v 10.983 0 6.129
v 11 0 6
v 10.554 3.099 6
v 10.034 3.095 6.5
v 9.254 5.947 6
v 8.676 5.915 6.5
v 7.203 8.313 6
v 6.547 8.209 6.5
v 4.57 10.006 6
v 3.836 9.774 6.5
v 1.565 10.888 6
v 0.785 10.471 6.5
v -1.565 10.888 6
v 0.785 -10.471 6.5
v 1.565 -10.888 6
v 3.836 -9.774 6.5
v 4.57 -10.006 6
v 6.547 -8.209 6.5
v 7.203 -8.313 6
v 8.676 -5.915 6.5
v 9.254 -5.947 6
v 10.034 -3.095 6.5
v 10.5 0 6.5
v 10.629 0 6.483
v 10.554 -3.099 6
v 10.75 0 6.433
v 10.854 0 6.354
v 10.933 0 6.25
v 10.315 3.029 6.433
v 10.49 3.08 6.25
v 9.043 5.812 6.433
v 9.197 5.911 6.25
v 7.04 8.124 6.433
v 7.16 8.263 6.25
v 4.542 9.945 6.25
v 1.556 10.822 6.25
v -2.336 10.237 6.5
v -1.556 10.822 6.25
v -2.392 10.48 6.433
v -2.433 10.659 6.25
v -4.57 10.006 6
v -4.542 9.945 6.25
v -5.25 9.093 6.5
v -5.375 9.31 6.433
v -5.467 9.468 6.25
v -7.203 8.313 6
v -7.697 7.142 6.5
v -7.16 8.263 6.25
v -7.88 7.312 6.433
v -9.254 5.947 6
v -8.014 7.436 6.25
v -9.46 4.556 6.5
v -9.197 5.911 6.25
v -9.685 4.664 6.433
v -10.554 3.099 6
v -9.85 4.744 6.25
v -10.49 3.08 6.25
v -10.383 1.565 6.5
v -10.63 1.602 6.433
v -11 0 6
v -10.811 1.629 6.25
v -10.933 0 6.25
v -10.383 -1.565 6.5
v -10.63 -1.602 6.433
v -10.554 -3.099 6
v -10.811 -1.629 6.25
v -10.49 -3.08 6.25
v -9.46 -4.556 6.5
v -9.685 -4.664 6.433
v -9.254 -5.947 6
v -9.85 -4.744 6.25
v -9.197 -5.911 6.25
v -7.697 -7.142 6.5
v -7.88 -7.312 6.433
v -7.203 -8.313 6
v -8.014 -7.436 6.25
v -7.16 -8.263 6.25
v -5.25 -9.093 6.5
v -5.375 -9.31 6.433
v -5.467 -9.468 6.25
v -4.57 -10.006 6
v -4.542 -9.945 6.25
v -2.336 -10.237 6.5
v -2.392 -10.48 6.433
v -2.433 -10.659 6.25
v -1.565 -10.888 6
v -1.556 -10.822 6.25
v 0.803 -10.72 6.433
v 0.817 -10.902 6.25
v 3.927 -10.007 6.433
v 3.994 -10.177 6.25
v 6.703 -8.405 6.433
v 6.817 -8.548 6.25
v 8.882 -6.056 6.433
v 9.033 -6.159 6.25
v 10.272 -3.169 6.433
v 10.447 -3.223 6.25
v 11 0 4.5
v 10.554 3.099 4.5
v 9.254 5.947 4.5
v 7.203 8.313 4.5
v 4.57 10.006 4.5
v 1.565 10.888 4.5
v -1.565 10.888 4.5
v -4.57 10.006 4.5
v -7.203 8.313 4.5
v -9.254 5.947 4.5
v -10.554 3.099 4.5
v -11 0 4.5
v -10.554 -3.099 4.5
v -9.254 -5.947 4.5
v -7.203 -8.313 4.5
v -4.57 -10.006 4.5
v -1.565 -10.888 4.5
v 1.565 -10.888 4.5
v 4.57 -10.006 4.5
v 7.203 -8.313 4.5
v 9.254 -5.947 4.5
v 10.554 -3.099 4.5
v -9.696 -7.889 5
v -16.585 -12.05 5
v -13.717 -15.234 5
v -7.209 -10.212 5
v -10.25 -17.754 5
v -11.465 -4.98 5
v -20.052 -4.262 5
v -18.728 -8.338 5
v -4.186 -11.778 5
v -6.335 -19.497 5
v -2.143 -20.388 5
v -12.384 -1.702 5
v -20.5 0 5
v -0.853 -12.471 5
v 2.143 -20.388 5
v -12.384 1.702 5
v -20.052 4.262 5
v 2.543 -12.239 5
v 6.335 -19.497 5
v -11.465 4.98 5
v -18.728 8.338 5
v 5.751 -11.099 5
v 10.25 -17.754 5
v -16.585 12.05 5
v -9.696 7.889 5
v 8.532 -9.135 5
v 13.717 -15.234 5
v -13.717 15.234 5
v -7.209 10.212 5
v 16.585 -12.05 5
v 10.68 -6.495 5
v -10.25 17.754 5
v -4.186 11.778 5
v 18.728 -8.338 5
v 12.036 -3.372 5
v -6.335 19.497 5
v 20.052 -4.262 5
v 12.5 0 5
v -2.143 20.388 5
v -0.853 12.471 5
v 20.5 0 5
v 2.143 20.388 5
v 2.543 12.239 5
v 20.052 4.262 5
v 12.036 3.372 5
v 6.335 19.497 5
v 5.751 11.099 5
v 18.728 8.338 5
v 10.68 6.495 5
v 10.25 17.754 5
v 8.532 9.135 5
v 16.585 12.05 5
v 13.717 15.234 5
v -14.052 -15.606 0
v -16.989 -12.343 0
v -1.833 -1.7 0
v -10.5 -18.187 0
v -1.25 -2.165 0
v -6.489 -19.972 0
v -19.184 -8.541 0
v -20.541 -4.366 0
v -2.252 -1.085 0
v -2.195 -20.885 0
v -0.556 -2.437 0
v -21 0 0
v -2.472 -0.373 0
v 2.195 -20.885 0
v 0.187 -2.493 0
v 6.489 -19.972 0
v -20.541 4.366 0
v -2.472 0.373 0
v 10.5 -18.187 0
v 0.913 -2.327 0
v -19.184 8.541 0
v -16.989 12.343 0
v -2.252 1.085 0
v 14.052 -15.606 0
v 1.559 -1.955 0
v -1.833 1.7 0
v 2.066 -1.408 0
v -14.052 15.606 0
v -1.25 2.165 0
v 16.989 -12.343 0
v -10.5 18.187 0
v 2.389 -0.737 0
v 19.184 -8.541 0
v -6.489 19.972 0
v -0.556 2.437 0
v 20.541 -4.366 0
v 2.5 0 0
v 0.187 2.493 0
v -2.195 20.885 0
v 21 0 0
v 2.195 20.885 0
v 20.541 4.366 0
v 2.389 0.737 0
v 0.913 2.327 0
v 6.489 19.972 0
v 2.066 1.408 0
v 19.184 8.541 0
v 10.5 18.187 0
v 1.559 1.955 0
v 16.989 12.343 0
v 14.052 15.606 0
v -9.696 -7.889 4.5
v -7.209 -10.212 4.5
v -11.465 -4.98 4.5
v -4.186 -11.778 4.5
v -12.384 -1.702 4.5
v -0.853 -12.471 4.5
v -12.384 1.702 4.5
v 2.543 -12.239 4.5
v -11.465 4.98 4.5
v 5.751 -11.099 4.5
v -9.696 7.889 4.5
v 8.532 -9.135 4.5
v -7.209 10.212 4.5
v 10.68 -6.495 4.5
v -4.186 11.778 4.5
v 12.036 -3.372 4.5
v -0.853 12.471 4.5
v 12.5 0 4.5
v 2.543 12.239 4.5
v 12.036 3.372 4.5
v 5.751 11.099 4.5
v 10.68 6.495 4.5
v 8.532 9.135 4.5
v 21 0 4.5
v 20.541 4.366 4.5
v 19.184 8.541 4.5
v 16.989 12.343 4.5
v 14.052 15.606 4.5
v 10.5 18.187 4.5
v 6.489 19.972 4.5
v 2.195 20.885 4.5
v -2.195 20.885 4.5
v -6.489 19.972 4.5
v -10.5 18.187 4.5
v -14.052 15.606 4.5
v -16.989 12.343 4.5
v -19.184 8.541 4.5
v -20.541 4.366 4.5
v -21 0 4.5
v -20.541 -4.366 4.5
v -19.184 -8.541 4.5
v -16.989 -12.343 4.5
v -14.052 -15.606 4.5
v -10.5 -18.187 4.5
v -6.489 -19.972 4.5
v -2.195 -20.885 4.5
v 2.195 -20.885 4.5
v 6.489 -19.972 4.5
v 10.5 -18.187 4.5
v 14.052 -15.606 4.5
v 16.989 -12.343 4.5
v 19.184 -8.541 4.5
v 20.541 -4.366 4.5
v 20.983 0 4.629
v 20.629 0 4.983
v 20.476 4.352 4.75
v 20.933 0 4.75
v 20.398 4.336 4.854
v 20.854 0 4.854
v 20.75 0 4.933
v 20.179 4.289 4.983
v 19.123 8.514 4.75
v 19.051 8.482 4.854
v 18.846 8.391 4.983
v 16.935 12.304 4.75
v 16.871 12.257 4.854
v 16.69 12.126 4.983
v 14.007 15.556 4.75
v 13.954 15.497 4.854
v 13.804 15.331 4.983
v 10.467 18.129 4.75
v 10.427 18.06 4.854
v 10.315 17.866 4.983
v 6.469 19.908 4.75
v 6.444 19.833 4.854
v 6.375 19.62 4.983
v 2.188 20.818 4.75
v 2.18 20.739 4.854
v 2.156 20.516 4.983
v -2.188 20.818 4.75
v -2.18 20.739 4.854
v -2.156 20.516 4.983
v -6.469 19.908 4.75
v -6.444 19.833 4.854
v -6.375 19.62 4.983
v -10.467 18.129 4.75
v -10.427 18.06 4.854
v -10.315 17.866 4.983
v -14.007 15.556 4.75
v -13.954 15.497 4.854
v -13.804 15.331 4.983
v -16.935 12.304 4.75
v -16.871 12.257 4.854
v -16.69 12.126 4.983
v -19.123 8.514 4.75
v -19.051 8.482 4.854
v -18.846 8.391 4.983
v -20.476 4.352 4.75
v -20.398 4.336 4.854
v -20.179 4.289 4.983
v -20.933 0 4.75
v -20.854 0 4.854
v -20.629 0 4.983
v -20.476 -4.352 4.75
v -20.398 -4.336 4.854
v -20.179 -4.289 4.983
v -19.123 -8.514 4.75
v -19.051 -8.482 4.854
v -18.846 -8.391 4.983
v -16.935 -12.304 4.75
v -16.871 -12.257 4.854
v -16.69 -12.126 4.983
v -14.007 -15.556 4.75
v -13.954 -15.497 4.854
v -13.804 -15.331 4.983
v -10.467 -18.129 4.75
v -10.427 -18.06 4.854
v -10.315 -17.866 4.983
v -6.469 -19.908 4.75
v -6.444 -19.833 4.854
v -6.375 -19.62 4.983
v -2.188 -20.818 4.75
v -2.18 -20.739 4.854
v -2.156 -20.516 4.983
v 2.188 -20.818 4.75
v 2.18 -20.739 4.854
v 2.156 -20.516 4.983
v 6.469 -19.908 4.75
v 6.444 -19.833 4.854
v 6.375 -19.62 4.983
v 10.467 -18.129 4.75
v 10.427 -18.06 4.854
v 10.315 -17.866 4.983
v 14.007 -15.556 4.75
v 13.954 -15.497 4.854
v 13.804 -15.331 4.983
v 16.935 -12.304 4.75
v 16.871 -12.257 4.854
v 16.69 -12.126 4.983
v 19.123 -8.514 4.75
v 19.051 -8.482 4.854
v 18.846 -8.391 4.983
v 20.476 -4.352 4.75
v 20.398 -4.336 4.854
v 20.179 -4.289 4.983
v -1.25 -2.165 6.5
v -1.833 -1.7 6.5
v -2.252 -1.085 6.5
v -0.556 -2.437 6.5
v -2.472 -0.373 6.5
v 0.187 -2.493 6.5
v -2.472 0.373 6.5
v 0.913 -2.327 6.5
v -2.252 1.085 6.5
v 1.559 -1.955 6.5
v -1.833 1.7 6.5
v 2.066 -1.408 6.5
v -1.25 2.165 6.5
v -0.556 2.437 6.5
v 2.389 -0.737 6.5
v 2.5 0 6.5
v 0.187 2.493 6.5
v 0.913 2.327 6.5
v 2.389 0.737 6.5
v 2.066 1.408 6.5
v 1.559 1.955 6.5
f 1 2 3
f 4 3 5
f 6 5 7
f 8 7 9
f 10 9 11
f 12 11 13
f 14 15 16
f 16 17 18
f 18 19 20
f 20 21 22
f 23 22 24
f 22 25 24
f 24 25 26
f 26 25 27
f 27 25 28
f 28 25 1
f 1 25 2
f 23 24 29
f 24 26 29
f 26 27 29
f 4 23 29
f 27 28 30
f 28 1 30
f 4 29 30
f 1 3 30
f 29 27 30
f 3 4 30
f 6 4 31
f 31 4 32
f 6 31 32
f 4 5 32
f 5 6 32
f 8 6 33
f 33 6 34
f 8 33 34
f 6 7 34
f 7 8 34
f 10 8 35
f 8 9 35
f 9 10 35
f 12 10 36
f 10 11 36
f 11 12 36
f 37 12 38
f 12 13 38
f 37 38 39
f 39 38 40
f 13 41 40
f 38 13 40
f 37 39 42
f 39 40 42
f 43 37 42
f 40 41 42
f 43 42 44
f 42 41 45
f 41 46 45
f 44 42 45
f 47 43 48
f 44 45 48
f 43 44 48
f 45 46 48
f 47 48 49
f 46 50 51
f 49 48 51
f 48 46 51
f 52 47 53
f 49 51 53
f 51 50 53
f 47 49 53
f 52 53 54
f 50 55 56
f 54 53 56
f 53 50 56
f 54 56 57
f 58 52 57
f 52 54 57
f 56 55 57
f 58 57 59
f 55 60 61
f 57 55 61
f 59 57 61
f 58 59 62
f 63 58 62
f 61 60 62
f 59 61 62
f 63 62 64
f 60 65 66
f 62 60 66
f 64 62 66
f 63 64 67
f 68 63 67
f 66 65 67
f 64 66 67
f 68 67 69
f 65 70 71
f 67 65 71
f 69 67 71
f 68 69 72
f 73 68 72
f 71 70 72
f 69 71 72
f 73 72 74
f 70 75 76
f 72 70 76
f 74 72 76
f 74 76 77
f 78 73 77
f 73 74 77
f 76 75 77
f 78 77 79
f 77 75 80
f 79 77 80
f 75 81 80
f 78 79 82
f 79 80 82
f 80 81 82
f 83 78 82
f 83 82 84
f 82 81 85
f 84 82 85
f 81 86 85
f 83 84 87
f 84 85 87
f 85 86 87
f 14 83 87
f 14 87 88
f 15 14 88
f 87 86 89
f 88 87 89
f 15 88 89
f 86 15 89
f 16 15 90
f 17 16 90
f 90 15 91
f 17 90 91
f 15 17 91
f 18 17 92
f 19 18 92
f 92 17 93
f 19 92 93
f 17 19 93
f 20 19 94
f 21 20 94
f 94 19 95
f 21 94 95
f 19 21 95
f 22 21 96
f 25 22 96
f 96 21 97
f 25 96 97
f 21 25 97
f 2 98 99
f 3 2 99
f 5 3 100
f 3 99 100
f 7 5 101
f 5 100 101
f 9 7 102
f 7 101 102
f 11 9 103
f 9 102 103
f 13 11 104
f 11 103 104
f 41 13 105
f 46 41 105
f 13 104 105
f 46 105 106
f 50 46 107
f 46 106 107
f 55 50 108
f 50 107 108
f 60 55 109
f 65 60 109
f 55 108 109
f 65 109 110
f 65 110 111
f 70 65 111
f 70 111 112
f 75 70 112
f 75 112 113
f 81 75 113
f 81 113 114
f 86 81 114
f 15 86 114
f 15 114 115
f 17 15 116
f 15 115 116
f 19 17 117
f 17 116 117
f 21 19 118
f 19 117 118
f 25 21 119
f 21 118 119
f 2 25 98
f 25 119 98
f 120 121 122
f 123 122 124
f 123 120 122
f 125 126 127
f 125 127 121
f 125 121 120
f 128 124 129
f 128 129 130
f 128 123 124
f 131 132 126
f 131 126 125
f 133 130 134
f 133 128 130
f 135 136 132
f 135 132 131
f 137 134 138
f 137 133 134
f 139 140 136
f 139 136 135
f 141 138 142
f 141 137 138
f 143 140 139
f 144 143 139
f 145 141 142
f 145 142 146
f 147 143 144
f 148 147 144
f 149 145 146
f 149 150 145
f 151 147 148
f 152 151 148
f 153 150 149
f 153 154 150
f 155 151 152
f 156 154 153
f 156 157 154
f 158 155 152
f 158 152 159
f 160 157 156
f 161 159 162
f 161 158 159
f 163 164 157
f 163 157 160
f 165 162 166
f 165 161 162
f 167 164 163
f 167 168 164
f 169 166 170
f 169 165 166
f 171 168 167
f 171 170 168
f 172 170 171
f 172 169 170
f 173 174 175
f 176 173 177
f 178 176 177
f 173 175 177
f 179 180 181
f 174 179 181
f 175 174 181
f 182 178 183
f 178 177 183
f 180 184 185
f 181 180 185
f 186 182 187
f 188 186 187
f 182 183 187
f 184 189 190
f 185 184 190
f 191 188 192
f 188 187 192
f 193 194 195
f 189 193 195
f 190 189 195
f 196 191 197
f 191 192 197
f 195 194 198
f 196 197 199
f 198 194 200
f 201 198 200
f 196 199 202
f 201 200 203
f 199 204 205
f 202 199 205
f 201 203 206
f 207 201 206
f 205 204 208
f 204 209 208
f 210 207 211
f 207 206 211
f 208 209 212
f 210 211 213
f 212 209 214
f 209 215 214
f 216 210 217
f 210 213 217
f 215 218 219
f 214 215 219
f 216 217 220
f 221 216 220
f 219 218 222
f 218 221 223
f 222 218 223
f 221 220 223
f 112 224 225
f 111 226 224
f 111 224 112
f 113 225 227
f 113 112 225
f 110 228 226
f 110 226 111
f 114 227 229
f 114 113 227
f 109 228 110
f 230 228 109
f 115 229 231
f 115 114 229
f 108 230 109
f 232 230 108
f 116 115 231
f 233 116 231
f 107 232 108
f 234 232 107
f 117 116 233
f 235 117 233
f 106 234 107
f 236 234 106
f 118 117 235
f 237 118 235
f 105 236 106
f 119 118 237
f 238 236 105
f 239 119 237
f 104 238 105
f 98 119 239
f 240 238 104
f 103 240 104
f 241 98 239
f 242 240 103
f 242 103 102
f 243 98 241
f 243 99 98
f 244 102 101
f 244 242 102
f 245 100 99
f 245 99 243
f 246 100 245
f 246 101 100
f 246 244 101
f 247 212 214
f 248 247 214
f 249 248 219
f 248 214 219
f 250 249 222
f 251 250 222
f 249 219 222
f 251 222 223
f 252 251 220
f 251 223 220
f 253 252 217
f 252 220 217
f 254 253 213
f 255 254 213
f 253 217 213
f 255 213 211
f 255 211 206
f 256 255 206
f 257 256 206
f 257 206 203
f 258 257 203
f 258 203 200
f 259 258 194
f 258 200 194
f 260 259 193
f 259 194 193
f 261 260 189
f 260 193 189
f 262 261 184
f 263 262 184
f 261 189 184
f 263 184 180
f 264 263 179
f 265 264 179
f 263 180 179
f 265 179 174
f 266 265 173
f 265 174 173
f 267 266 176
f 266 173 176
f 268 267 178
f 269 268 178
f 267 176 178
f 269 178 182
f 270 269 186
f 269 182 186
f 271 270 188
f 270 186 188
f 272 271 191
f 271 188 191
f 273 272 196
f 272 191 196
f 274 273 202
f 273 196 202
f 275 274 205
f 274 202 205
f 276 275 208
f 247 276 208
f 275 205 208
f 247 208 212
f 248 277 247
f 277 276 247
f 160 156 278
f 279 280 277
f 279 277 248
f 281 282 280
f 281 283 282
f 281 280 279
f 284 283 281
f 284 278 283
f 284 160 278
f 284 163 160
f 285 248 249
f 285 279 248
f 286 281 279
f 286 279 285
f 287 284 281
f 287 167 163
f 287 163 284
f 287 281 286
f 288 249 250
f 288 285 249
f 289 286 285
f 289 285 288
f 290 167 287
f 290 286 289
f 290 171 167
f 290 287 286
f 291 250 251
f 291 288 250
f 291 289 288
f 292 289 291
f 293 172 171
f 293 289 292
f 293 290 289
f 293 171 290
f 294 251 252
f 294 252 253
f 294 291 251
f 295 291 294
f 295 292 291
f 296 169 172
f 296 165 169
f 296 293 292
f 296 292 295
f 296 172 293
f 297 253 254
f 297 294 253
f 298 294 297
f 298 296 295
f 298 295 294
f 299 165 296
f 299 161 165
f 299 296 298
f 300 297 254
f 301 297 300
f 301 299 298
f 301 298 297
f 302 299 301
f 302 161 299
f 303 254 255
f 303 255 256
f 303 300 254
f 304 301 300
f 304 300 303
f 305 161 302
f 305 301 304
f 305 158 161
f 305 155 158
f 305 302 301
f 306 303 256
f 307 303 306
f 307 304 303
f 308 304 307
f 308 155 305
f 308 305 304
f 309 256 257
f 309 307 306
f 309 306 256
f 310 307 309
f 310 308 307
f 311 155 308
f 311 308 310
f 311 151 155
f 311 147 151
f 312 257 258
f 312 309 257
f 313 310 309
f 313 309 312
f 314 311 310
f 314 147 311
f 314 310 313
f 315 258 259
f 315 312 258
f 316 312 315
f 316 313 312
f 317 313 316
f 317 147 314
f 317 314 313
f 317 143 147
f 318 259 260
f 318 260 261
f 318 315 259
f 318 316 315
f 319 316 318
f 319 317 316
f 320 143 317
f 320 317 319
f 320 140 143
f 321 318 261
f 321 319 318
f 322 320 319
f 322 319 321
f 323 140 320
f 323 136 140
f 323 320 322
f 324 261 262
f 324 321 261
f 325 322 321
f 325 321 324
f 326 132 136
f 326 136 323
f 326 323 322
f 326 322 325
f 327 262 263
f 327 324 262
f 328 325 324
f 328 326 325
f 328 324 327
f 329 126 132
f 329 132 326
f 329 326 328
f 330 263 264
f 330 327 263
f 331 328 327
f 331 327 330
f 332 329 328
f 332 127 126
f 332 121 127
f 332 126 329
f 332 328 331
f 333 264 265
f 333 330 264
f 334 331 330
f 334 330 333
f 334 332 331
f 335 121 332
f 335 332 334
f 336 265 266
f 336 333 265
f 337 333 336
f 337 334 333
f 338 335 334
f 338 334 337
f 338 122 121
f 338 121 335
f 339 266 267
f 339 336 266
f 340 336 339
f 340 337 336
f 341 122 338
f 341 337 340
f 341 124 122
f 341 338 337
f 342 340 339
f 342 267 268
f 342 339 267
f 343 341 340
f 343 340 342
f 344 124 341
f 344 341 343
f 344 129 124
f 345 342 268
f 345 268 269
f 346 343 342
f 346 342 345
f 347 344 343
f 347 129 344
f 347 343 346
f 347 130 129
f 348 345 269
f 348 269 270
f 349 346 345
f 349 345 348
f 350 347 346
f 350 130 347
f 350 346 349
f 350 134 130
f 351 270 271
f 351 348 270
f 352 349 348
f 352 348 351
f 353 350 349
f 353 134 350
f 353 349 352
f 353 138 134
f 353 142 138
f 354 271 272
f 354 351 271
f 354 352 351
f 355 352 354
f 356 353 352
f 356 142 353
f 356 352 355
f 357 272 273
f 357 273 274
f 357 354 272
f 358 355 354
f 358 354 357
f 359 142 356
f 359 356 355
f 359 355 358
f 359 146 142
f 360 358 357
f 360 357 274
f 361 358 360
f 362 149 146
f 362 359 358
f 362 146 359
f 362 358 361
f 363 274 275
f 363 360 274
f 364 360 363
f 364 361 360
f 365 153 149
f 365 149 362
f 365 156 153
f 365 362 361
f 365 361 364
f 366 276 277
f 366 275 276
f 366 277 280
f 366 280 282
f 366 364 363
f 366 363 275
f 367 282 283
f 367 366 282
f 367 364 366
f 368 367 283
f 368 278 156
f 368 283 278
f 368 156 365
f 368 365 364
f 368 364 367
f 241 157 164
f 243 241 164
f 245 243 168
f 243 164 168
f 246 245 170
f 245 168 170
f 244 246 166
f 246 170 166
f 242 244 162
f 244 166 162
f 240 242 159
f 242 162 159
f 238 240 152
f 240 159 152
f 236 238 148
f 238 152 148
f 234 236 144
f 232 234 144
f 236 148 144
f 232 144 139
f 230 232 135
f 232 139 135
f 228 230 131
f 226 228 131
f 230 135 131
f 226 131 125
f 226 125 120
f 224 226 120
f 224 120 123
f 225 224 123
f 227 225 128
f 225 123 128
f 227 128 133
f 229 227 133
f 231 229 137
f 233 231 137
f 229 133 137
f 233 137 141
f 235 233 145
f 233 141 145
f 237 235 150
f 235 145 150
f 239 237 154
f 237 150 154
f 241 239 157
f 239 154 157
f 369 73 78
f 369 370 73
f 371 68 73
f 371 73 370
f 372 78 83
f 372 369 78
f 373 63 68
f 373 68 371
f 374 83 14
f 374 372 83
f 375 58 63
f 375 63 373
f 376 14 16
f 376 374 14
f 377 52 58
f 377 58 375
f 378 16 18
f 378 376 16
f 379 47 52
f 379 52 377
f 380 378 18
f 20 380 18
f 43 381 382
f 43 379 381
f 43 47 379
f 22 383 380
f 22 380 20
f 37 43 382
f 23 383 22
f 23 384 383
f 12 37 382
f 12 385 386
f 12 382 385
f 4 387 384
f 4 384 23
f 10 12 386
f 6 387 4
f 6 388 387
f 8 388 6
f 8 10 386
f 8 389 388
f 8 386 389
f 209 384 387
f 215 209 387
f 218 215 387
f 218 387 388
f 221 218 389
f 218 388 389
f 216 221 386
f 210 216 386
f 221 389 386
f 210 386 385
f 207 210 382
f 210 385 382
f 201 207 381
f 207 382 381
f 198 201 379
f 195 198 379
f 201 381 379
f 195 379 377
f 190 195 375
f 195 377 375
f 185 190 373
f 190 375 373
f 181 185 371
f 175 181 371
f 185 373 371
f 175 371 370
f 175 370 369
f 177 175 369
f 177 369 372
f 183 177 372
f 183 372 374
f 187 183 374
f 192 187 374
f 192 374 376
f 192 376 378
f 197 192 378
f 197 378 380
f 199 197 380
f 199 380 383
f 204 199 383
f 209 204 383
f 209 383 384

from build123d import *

# Parameters (mm, degrees)
CROQUIS1_R              = 21
SALIENTE_EXTRUIR1_DEPTH = 5
CROQUIS2_R              = 12.5
CORTAR_EXTRUIR1_DEPTH   = 0.5
CROQUIS3_R              = 11
SALIENTE_EXTRUIR2_DEPTH = 2
CROQUIS4_R              = 2.5
CORTAR_EXTRUIR2_DEPTH   = 7.5
REDONDEO1_R             = 0.5
REDONDEO2_R             = 0.5


with BuildPart() as part:
    # Croquis1 → Saliente-Extruir1 (new body)
    with BuildSketch(Plane.XY):
        Circle(CROQUIS1_R)
    extrude(amount=SALIENTE_EXTRUIR1_DEPTH)

    # Croquis2 → Cortar-Extruir1 (cut)
    with BuildSketch(Plane.XY.offset(5)):
        Circle(CROQUIS2_R)
    extrude(amount=-CORTAR_EXTRUIR1_DEPTH, mode=Mode.SUBTRACT)

    # Croquis3 → Saliente-Extruir2 (add)
    with BuildSketch(Plane.XY.offset(4.5)):
        Circle(CROQUIS3_R)
    extrude(amount=SALIENTE_EXTRUIR2_DEPTH)

    # Croquis4 → Cortar-Extruir2 (cut, through all)
    with BuildSketch(Plane.XY.offset(6.5)):
        Circle(CROQUIS4_R)
    extrude(amount=-CORTAR_EXTRUIR2_DEPTH, mode=Mode.SUBTRACT)

    # Redondeo1
    redondeo1_edges = [part.edges().sort_by_distance(p)[0] for p in [
        (-21, 0, 5),
    ]]
    fillet(redondeo1_edges, radius=REDONDEO1_R)

    # Redondeo2
    redondeo2_edges = [part.edges().sort_by_distance(p)[0] for p in [
        (-11, 0, 6.5),
    ]]
    fillet(redondeo2_edges, radius=REDONDEO2_R)


solid = part.part
